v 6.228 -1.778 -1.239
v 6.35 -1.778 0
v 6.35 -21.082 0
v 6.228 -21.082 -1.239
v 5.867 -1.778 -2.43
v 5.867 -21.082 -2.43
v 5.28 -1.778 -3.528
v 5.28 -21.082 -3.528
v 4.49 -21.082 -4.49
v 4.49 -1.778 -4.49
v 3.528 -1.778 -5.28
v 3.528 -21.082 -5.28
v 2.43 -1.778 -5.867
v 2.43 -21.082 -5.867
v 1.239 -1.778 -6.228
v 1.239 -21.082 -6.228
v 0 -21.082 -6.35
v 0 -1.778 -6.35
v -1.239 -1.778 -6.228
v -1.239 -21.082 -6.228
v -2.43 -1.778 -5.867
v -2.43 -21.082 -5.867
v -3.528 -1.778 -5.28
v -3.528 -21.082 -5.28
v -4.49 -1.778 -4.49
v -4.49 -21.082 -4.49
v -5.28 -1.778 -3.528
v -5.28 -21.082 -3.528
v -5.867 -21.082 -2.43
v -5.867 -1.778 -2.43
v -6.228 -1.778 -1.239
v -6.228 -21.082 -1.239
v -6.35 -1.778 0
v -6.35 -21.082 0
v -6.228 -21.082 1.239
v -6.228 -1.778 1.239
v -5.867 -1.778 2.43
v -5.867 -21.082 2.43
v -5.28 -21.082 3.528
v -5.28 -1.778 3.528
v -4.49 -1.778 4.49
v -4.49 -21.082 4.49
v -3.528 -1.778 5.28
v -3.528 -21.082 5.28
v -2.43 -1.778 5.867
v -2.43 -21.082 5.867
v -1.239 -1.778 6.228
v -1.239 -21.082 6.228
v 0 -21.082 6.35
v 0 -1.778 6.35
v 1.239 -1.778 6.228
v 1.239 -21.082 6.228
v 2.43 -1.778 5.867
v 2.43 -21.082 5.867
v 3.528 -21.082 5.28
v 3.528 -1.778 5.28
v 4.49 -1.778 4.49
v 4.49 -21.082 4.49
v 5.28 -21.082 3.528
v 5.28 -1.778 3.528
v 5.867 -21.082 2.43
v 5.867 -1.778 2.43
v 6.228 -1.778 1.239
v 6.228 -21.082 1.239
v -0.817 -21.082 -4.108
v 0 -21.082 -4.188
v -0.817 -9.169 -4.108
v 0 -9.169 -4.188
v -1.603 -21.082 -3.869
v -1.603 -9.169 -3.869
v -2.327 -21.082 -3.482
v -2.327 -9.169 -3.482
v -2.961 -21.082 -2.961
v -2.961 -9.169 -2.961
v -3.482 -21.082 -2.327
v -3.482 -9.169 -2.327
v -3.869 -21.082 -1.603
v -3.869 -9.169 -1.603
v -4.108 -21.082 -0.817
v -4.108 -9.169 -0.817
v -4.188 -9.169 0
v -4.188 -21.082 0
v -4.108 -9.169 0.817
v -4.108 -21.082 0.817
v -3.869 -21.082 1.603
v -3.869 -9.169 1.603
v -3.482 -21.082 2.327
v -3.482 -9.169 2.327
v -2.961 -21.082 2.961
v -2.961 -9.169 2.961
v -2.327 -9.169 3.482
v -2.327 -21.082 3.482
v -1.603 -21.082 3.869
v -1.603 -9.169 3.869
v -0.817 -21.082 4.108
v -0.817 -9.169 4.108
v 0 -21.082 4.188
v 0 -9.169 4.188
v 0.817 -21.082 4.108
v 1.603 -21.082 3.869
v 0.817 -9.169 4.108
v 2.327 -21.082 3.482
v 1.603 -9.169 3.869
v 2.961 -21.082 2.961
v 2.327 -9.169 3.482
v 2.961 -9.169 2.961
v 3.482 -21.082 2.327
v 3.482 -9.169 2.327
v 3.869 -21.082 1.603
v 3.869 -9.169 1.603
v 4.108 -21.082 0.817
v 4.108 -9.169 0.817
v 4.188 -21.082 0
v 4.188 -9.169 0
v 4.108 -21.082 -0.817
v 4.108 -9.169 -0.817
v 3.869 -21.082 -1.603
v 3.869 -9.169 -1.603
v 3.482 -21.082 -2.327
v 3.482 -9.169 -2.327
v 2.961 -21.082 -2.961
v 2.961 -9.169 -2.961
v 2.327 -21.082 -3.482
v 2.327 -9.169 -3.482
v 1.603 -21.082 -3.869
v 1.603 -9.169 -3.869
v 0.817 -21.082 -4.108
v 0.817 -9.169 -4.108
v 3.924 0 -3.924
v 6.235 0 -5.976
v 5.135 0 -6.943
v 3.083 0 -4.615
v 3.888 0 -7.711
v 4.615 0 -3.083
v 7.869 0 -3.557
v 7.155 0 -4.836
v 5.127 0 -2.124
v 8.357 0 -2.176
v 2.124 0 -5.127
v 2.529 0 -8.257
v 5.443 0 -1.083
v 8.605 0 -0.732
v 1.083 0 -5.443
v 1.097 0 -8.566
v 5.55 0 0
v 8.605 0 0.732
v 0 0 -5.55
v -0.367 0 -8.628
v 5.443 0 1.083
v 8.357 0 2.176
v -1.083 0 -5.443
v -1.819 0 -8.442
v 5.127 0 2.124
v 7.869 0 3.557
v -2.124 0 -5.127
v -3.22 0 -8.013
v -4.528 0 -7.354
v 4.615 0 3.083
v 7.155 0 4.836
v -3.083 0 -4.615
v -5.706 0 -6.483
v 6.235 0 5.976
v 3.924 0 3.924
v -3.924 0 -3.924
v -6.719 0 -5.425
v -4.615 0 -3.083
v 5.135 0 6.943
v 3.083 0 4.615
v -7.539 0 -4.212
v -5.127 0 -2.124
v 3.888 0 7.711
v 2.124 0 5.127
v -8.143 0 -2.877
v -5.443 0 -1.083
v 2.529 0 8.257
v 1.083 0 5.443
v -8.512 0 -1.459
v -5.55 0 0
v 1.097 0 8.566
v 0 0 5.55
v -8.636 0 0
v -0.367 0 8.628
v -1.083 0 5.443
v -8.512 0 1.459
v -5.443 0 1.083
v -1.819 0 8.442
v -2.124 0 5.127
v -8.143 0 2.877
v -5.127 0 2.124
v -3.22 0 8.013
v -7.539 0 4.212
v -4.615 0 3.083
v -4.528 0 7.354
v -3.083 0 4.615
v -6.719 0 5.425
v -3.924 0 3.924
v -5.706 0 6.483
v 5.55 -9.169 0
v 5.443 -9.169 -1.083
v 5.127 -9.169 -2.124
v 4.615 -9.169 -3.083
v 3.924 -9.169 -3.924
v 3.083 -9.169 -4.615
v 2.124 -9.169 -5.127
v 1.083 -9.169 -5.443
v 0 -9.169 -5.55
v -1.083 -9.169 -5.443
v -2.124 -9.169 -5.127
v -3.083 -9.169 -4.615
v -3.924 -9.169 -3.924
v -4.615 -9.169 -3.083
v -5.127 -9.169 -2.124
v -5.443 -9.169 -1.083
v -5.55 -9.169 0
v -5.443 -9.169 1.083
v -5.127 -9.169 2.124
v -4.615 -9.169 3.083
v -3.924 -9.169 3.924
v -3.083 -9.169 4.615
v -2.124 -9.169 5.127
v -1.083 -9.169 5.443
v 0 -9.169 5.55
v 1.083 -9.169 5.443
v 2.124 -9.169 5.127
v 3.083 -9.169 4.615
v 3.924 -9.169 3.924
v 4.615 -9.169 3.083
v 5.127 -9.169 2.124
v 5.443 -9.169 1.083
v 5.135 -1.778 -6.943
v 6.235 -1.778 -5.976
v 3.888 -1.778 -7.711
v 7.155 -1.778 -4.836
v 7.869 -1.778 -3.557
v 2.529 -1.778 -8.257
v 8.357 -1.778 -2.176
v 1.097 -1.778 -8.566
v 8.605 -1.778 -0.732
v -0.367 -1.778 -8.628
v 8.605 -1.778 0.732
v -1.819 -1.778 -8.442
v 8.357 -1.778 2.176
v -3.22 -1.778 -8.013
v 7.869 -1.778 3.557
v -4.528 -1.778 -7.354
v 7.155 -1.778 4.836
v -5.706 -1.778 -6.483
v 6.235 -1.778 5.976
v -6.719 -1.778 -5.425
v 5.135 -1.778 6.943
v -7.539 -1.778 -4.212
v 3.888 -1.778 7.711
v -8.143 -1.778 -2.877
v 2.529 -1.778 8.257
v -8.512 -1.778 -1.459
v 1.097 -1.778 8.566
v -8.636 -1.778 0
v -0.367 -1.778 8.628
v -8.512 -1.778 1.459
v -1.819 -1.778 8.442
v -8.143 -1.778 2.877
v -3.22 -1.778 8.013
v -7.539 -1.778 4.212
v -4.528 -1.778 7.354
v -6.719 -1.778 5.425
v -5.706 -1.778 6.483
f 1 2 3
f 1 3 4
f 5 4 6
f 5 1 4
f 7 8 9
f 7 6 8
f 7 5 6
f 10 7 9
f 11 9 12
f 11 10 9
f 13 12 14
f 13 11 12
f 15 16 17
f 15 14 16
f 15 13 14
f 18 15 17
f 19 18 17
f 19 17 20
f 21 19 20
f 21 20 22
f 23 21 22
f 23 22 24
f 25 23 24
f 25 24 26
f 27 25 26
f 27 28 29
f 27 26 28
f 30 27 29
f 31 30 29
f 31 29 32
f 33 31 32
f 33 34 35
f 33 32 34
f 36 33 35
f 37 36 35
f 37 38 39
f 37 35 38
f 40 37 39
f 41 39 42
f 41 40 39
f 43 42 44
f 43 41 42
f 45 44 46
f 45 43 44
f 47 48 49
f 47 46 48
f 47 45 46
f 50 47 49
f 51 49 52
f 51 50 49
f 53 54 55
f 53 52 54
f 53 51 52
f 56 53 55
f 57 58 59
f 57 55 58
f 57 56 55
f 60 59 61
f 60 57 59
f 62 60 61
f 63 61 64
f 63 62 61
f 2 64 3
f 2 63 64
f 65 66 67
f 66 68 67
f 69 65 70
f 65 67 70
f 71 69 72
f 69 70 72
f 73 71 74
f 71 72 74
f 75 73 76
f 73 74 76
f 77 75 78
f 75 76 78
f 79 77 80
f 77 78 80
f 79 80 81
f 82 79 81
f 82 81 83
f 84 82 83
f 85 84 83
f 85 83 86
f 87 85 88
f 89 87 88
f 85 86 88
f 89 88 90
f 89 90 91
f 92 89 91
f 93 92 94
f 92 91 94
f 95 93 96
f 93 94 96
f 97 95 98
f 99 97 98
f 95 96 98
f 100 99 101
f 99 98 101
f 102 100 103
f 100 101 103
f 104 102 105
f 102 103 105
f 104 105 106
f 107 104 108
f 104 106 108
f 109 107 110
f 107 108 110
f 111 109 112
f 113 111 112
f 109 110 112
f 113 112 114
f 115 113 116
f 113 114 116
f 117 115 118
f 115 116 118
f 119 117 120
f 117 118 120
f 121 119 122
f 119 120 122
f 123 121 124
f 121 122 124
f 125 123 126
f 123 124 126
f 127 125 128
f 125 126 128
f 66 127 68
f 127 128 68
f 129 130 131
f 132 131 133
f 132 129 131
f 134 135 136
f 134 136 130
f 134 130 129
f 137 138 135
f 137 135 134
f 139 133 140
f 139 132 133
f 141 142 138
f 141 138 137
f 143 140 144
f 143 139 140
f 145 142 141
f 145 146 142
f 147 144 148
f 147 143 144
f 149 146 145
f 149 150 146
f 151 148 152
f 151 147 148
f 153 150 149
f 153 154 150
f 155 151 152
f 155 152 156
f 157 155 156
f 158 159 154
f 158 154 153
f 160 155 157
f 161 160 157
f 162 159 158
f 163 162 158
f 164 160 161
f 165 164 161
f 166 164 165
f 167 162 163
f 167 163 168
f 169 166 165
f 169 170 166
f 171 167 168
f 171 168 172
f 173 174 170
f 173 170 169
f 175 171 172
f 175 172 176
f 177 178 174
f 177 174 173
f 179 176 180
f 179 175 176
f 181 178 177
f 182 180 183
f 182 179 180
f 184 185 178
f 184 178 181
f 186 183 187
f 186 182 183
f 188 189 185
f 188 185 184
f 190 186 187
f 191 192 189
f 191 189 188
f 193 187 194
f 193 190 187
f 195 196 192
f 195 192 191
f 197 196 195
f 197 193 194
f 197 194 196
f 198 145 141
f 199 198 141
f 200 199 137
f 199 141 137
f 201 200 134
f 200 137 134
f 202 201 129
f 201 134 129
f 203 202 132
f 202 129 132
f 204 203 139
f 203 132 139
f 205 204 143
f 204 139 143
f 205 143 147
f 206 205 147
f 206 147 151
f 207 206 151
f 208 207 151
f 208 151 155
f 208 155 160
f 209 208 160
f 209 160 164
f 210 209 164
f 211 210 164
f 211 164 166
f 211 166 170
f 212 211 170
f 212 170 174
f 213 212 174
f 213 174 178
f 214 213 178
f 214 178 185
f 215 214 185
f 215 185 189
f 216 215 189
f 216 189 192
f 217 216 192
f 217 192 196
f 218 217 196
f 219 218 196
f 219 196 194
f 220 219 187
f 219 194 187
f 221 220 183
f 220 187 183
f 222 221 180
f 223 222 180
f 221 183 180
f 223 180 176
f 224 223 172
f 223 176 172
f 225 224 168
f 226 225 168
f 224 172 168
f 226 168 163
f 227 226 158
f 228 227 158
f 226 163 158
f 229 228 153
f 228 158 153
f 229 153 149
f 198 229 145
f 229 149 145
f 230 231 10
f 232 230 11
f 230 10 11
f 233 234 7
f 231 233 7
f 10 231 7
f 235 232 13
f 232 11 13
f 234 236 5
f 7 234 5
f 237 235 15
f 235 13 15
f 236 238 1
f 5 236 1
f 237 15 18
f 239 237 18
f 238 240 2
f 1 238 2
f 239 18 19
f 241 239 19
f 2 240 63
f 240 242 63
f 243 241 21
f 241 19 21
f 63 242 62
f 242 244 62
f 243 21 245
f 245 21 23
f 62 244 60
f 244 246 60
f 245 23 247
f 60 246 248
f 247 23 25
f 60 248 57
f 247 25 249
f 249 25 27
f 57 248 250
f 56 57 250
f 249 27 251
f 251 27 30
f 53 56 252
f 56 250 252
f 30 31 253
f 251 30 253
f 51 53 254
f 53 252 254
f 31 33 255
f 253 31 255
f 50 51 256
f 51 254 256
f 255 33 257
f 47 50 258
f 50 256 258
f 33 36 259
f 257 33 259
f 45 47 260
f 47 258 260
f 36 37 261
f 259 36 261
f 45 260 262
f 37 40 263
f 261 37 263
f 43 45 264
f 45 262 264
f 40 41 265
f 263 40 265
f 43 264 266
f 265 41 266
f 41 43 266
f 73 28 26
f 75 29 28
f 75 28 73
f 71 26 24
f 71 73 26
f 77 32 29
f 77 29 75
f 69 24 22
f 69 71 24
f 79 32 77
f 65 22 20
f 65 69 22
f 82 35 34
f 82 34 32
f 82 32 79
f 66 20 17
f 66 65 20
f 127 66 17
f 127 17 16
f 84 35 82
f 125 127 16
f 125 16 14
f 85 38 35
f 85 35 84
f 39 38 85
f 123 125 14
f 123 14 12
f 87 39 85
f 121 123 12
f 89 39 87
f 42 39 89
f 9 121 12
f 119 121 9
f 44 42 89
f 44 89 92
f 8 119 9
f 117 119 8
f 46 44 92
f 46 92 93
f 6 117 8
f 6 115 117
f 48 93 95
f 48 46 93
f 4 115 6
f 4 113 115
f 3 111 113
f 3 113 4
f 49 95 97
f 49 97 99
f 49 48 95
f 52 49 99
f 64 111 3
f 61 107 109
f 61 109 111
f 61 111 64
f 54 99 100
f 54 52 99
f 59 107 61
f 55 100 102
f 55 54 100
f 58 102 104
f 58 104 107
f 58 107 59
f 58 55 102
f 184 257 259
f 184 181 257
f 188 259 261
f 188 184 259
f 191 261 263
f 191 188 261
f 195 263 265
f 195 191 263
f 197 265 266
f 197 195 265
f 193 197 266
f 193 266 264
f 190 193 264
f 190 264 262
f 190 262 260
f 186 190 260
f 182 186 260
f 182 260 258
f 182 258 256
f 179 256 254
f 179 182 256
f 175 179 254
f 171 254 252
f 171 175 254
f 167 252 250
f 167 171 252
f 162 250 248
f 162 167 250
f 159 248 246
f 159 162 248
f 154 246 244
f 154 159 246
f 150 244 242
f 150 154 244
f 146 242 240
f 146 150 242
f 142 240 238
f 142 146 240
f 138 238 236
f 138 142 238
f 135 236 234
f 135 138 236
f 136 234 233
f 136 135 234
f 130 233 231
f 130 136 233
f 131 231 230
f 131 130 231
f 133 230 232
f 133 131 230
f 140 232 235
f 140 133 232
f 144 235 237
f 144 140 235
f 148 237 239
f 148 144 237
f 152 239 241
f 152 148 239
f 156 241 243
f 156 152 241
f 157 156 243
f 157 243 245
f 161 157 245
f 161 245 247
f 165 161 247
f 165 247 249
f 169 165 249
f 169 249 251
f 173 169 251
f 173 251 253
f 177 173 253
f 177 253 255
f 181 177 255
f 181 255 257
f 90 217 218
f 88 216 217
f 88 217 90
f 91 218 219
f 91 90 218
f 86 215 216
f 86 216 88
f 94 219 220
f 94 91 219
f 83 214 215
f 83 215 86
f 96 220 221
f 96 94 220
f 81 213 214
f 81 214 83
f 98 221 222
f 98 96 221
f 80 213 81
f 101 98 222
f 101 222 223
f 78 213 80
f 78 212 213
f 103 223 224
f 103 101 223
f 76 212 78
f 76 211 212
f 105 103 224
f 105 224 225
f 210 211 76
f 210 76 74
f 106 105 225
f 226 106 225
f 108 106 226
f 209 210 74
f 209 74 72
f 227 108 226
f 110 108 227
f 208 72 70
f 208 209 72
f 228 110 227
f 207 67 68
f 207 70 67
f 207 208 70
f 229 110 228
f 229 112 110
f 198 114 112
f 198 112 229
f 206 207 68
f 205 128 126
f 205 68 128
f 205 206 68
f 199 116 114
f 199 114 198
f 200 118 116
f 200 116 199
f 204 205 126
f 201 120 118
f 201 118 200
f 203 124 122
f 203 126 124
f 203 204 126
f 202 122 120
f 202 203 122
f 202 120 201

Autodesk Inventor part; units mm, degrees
ref_plane "YZ Plane" through (0, 0, 0) normal (1, 0, 0) x (0, 1, 0)
ref_plane "XZ Plane" through (0, 0, 0) normal (0, 1, 0) x (-1, 0, 0)
ref_plane "XY Plane" through (0, 0, 0) normal (0, 0, 1) x (1, 0, 0)
sketch "Sketch2" plane through (0, 0, 0) normal (0, 1, 0) x (-1, 0, 0)
  circle A0 centre (0, 0) radius 8.636
  dimension "d0" = 17.272
extrude "Extrusion1" add sketch "Sketch2" against normal blind 1.778
sketch "Sketch3" plane through (0, -1.778, 0) normal (0, -1, 0) x (1, 0, 0)
  circle A0 centre (0, 0) radius 6.35
  dimension "d3" = 12.7
extrude "Extrusion2" add sketch "Sketch3" along normal blind 19.304
sketch "Sketch4" plane through (0, -21.082, 0) normal (0, -1, 0) x (1, 0, 0)
  point P0 (0, 0)
  point P1 (0, 0)
hole "Hole1" at (0, -21.082, 0) direction (0, 1, 0) diameter 8.376 end through all thread size "M10x1.5" class "6H" standard "ANSI Metric M Profile"
sketch "Sketch5" plane through (0, 0, 0) normal (0, 1, 0) x (1, 0, 0)
  circle A0 centre (0, 0) radius 5.5499
  dimension "d13" = 11.0998
extrude "Extrusion3" cut sketch "Sketch5" against normal blind 9.1694
properties part number "M10x1_5_insert"
